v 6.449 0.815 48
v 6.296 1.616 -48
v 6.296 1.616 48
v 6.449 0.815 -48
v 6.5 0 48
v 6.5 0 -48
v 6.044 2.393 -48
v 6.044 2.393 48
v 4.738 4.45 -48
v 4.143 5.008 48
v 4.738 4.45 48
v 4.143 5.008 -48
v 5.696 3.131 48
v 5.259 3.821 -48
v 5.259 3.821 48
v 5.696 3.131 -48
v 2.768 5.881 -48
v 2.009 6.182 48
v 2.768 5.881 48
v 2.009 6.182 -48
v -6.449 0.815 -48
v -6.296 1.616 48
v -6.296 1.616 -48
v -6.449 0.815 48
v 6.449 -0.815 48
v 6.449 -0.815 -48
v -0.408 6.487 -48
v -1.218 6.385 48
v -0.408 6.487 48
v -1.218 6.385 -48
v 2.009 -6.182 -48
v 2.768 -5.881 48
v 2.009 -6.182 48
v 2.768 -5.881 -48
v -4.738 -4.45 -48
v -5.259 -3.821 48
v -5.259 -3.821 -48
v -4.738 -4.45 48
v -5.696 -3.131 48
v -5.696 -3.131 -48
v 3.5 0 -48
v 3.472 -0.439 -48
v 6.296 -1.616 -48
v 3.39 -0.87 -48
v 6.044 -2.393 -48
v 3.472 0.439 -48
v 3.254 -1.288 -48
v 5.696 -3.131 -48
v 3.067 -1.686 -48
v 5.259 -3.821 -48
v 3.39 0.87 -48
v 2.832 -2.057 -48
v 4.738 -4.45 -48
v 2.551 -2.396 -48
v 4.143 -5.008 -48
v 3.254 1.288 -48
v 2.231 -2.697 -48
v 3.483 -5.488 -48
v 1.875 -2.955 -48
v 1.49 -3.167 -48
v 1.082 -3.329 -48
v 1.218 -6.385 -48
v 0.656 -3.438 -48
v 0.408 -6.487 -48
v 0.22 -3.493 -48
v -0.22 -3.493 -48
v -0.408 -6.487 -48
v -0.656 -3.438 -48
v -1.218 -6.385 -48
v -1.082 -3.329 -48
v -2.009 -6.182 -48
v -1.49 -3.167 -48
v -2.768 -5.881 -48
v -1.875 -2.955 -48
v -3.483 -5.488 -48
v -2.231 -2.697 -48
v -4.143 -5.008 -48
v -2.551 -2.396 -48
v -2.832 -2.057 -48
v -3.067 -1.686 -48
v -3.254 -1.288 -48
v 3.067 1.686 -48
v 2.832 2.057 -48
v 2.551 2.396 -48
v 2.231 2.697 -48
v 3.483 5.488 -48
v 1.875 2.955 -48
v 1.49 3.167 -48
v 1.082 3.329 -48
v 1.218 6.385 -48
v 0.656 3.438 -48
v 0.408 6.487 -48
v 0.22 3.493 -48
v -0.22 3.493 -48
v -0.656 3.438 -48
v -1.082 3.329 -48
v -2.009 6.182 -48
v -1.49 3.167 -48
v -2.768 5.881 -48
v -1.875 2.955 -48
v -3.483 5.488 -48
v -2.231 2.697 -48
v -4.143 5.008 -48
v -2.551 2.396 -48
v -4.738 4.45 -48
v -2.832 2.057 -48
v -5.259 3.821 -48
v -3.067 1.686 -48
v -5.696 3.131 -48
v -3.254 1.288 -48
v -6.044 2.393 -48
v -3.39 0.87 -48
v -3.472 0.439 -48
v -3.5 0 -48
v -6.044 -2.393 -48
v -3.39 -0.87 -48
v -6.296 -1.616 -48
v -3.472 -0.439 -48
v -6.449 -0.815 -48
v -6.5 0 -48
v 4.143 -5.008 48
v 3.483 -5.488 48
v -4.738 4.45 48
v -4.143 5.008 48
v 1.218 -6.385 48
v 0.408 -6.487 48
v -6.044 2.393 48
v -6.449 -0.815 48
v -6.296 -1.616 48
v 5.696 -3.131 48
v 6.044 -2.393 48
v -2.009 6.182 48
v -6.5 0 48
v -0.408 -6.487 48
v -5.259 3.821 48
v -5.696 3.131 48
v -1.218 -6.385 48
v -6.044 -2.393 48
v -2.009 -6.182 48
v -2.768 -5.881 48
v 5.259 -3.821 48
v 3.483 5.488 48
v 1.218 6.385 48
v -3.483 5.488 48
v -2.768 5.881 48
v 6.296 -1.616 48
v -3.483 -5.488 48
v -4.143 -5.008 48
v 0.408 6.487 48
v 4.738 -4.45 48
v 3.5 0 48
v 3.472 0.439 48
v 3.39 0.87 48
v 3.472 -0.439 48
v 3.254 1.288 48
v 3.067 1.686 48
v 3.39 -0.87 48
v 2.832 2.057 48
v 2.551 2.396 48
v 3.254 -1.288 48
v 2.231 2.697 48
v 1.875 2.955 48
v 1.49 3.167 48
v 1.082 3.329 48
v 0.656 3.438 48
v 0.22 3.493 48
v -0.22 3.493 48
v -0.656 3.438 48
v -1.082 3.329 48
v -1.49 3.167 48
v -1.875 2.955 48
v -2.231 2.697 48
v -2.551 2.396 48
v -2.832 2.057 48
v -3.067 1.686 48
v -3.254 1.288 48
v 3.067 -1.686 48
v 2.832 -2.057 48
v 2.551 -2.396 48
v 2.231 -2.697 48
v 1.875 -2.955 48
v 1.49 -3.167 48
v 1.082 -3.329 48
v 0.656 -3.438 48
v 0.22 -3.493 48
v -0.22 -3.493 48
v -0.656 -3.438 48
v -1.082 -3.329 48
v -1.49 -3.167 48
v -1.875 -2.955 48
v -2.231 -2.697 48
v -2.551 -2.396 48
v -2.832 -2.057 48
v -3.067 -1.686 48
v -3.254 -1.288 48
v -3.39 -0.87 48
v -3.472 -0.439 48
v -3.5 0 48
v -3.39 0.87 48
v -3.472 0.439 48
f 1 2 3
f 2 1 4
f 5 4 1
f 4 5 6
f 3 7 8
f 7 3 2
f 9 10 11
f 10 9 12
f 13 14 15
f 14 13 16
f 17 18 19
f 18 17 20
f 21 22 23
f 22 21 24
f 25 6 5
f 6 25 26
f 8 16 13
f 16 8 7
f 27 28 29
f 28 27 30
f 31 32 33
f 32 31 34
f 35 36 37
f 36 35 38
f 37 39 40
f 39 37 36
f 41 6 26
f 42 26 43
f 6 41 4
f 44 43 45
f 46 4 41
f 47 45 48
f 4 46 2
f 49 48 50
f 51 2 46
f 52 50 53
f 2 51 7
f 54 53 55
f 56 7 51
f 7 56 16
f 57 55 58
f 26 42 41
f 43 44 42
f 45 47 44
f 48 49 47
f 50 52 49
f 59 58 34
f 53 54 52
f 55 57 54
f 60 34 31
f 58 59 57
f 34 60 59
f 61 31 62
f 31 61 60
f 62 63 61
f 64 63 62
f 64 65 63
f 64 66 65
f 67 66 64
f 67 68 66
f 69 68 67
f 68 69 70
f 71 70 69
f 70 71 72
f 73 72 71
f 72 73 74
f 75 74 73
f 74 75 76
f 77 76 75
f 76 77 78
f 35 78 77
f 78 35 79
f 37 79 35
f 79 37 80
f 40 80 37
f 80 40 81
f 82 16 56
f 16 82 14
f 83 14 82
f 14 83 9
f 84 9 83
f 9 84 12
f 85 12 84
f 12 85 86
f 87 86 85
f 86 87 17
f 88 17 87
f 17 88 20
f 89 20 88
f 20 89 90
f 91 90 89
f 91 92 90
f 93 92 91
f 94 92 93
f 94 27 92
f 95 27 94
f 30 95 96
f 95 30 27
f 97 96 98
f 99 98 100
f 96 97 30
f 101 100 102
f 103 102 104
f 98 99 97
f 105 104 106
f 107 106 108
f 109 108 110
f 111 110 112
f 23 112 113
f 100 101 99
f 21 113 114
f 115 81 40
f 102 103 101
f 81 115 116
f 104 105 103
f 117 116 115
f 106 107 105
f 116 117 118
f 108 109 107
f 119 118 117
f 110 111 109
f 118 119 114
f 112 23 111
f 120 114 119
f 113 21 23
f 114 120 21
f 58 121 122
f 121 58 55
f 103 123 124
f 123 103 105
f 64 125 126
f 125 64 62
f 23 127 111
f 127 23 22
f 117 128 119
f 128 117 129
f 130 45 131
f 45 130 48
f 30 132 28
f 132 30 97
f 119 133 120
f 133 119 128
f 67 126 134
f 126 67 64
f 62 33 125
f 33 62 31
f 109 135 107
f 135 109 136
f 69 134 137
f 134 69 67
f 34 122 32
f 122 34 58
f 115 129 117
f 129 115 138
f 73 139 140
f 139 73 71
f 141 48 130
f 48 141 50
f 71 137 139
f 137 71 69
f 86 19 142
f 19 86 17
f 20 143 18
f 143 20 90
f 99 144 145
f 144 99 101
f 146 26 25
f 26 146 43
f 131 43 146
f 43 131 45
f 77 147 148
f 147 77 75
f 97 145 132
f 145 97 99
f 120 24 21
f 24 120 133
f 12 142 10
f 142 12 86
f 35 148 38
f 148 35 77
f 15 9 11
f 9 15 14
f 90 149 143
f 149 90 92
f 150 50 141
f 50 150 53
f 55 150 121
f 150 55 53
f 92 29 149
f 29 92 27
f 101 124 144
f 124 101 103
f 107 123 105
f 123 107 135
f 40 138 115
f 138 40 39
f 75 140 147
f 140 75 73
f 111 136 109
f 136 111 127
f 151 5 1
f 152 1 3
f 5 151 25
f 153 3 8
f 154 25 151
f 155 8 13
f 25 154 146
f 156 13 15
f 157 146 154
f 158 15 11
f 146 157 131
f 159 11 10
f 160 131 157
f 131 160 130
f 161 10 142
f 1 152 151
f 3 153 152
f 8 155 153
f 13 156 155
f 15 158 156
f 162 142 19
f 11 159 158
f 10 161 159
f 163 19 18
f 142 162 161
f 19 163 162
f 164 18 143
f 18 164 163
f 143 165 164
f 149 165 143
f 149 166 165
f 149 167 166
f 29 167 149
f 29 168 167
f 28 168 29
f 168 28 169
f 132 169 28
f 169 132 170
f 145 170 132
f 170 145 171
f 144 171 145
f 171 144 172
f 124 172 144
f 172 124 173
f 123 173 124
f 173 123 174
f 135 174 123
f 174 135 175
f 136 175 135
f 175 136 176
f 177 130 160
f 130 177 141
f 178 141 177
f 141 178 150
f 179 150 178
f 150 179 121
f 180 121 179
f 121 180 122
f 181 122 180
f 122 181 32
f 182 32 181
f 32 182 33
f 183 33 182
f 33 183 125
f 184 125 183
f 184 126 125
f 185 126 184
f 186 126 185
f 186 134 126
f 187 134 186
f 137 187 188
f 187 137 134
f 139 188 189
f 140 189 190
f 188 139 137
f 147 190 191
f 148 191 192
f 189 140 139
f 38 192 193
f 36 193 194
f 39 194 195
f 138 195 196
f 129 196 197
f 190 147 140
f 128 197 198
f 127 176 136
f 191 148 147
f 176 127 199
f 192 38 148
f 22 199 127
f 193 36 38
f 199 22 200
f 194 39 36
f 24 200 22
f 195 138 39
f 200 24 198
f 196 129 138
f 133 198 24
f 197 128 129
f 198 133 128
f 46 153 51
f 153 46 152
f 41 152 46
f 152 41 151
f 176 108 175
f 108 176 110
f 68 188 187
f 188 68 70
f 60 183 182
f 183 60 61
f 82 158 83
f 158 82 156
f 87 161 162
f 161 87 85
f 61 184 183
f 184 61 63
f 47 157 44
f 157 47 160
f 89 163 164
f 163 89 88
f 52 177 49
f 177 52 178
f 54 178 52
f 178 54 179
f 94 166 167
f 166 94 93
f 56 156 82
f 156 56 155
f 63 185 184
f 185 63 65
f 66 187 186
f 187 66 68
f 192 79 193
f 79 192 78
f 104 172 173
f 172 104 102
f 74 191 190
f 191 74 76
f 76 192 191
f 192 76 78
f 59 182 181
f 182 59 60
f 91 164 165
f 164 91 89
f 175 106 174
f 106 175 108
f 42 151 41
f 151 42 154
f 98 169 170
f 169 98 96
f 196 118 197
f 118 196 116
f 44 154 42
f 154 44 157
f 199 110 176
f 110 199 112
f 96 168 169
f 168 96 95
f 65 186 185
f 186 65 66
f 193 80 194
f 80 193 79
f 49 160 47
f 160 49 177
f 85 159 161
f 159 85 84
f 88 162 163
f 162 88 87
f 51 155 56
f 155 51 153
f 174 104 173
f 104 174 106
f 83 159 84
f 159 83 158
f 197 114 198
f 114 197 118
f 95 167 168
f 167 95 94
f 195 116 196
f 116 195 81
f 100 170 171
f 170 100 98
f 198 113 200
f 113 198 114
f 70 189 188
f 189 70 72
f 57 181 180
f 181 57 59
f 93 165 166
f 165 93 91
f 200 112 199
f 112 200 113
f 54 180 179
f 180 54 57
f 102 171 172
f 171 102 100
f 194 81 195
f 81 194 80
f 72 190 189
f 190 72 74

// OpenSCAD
$fn = 50;


difference() {
	union() {
		translate(v = [0, 0, -48.0000000000]) {
			cylinder(h = 96, r = 6.5000000000);
		}
	}
	union() {
		translate(v = [0, 0, -100.0000000000]) {
			cylinder(h = 200, r = 3.5000000000);
		}
	}
}
